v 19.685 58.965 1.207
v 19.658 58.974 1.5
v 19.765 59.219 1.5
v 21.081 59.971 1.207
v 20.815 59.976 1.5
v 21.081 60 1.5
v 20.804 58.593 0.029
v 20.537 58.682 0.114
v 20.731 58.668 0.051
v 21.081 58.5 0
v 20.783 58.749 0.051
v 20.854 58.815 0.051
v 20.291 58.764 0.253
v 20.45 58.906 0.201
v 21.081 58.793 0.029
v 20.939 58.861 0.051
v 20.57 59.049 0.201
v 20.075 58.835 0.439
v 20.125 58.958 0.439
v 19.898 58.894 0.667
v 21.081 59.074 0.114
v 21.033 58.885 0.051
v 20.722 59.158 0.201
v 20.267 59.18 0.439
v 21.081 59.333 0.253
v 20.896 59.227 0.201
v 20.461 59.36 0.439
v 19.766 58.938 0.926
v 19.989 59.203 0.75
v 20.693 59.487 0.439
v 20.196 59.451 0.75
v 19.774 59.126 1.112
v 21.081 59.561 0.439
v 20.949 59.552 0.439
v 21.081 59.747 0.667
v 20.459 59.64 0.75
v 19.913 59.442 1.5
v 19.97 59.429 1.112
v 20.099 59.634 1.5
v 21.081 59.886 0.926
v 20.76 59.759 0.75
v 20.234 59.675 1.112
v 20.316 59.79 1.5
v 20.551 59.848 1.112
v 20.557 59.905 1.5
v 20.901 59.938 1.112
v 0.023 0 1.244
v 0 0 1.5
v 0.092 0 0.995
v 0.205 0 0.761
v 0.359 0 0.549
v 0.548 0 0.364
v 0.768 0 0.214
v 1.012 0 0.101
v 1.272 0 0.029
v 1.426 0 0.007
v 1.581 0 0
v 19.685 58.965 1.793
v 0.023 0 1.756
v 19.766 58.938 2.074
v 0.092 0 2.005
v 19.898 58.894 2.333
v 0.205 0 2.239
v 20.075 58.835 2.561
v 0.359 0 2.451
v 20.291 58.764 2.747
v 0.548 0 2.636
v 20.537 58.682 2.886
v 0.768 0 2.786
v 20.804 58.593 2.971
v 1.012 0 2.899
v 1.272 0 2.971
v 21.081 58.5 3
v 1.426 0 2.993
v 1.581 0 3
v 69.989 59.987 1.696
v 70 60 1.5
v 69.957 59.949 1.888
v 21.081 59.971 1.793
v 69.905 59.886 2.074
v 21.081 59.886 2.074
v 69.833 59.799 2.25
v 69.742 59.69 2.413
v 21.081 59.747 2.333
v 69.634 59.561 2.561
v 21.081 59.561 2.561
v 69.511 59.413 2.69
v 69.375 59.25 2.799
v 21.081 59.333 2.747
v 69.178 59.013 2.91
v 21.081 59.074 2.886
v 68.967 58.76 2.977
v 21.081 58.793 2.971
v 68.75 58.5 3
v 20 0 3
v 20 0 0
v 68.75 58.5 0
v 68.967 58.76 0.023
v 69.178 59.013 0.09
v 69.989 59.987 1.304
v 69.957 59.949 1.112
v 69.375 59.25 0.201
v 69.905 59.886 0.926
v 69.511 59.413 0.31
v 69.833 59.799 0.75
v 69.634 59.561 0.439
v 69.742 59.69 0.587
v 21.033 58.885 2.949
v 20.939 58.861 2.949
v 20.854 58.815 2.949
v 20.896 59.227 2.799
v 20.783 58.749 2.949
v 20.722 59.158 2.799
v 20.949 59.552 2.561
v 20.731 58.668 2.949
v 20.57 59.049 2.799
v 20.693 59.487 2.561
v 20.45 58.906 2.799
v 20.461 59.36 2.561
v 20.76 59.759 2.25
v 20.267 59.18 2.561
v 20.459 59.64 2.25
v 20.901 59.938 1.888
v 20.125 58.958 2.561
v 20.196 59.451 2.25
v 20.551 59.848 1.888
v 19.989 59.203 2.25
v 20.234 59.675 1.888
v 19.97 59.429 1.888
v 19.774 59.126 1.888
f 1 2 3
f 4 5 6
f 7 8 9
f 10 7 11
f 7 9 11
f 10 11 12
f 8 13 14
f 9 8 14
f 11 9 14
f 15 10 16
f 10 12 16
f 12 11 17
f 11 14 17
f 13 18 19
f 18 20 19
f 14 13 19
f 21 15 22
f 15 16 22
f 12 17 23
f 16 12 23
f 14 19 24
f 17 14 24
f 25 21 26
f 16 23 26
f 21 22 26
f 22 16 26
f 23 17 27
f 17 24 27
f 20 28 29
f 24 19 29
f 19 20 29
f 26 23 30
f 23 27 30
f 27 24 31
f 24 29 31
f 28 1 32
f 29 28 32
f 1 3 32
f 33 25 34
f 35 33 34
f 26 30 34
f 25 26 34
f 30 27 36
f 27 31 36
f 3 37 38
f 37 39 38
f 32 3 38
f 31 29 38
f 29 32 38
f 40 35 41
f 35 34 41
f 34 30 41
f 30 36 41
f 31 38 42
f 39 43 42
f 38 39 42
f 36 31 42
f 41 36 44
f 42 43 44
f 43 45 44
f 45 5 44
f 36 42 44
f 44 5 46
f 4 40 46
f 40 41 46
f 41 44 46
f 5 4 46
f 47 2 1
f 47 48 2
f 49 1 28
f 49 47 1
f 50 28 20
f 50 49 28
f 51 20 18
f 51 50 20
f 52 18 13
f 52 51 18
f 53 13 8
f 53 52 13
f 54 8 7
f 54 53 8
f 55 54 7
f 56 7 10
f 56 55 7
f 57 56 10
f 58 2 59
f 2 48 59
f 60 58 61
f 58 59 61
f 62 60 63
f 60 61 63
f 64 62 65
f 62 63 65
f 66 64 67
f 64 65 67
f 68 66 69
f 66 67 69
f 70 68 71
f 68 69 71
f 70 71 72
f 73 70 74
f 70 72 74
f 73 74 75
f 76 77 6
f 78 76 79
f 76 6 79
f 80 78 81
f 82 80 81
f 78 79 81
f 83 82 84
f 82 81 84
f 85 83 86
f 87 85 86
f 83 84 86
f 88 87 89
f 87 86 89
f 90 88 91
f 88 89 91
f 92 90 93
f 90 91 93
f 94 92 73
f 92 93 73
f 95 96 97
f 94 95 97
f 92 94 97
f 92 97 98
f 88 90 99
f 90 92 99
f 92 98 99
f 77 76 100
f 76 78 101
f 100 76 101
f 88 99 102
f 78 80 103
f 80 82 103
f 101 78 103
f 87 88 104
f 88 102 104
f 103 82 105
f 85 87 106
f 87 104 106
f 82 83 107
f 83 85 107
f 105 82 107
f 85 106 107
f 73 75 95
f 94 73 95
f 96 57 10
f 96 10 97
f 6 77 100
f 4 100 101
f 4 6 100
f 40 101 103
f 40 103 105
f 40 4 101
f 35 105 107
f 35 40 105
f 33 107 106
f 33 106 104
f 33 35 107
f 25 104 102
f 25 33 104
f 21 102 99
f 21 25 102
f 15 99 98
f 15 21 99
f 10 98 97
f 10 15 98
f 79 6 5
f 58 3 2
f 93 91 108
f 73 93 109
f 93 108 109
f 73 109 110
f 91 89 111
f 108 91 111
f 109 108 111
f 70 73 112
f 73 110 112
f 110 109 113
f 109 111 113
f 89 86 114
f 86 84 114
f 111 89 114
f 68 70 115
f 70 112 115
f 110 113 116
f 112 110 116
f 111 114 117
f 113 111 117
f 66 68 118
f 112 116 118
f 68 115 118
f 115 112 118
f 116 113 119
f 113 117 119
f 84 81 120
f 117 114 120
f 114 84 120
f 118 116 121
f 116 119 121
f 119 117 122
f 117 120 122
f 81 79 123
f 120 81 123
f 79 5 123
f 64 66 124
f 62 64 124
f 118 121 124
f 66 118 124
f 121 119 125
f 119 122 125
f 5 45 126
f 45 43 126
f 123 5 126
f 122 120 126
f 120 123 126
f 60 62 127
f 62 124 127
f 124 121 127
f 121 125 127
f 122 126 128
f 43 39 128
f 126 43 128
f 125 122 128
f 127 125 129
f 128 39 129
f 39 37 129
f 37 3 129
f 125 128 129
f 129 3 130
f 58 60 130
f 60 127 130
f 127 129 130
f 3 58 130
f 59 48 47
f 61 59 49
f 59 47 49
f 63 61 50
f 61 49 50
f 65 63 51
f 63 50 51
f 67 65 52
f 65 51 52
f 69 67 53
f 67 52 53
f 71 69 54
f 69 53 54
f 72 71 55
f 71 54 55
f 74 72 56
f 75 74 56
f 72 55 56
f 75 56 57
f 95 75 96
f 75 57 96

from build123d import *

# Parameters (mm, degrees)
F1_DEPTH = 3
F2_R     = 1.49999


# Not quite as in the source:
# - a fillet or chamfer is up to 0.001 mm smaller than in the source, because OpenCascade refuses the exact size


with BuildPart() as f1:
    # F0 (on Top) → F1 (new body)
    with BuildSketch(Plane.XY):
        Polygon((20, 60), (0, 0), (20, 0), (70, 60), align=None)
    extrude(amount=F1_DEPTH)

    # F2 (radius 1.5 in the source; OpenCascade refuses exactly that, so slightly less here)
    f2_edges = [f1.edges().sort_by_distance(p)[0] for p in [
        (45, 60, 3),
        (10, 30, 0),
        (10, 30, 3),
        (45, 60, 0),
        (20, 60, 1.5),
    ]]
    fillet(f2_edges, radius=F2_R)


solid = f1.part
